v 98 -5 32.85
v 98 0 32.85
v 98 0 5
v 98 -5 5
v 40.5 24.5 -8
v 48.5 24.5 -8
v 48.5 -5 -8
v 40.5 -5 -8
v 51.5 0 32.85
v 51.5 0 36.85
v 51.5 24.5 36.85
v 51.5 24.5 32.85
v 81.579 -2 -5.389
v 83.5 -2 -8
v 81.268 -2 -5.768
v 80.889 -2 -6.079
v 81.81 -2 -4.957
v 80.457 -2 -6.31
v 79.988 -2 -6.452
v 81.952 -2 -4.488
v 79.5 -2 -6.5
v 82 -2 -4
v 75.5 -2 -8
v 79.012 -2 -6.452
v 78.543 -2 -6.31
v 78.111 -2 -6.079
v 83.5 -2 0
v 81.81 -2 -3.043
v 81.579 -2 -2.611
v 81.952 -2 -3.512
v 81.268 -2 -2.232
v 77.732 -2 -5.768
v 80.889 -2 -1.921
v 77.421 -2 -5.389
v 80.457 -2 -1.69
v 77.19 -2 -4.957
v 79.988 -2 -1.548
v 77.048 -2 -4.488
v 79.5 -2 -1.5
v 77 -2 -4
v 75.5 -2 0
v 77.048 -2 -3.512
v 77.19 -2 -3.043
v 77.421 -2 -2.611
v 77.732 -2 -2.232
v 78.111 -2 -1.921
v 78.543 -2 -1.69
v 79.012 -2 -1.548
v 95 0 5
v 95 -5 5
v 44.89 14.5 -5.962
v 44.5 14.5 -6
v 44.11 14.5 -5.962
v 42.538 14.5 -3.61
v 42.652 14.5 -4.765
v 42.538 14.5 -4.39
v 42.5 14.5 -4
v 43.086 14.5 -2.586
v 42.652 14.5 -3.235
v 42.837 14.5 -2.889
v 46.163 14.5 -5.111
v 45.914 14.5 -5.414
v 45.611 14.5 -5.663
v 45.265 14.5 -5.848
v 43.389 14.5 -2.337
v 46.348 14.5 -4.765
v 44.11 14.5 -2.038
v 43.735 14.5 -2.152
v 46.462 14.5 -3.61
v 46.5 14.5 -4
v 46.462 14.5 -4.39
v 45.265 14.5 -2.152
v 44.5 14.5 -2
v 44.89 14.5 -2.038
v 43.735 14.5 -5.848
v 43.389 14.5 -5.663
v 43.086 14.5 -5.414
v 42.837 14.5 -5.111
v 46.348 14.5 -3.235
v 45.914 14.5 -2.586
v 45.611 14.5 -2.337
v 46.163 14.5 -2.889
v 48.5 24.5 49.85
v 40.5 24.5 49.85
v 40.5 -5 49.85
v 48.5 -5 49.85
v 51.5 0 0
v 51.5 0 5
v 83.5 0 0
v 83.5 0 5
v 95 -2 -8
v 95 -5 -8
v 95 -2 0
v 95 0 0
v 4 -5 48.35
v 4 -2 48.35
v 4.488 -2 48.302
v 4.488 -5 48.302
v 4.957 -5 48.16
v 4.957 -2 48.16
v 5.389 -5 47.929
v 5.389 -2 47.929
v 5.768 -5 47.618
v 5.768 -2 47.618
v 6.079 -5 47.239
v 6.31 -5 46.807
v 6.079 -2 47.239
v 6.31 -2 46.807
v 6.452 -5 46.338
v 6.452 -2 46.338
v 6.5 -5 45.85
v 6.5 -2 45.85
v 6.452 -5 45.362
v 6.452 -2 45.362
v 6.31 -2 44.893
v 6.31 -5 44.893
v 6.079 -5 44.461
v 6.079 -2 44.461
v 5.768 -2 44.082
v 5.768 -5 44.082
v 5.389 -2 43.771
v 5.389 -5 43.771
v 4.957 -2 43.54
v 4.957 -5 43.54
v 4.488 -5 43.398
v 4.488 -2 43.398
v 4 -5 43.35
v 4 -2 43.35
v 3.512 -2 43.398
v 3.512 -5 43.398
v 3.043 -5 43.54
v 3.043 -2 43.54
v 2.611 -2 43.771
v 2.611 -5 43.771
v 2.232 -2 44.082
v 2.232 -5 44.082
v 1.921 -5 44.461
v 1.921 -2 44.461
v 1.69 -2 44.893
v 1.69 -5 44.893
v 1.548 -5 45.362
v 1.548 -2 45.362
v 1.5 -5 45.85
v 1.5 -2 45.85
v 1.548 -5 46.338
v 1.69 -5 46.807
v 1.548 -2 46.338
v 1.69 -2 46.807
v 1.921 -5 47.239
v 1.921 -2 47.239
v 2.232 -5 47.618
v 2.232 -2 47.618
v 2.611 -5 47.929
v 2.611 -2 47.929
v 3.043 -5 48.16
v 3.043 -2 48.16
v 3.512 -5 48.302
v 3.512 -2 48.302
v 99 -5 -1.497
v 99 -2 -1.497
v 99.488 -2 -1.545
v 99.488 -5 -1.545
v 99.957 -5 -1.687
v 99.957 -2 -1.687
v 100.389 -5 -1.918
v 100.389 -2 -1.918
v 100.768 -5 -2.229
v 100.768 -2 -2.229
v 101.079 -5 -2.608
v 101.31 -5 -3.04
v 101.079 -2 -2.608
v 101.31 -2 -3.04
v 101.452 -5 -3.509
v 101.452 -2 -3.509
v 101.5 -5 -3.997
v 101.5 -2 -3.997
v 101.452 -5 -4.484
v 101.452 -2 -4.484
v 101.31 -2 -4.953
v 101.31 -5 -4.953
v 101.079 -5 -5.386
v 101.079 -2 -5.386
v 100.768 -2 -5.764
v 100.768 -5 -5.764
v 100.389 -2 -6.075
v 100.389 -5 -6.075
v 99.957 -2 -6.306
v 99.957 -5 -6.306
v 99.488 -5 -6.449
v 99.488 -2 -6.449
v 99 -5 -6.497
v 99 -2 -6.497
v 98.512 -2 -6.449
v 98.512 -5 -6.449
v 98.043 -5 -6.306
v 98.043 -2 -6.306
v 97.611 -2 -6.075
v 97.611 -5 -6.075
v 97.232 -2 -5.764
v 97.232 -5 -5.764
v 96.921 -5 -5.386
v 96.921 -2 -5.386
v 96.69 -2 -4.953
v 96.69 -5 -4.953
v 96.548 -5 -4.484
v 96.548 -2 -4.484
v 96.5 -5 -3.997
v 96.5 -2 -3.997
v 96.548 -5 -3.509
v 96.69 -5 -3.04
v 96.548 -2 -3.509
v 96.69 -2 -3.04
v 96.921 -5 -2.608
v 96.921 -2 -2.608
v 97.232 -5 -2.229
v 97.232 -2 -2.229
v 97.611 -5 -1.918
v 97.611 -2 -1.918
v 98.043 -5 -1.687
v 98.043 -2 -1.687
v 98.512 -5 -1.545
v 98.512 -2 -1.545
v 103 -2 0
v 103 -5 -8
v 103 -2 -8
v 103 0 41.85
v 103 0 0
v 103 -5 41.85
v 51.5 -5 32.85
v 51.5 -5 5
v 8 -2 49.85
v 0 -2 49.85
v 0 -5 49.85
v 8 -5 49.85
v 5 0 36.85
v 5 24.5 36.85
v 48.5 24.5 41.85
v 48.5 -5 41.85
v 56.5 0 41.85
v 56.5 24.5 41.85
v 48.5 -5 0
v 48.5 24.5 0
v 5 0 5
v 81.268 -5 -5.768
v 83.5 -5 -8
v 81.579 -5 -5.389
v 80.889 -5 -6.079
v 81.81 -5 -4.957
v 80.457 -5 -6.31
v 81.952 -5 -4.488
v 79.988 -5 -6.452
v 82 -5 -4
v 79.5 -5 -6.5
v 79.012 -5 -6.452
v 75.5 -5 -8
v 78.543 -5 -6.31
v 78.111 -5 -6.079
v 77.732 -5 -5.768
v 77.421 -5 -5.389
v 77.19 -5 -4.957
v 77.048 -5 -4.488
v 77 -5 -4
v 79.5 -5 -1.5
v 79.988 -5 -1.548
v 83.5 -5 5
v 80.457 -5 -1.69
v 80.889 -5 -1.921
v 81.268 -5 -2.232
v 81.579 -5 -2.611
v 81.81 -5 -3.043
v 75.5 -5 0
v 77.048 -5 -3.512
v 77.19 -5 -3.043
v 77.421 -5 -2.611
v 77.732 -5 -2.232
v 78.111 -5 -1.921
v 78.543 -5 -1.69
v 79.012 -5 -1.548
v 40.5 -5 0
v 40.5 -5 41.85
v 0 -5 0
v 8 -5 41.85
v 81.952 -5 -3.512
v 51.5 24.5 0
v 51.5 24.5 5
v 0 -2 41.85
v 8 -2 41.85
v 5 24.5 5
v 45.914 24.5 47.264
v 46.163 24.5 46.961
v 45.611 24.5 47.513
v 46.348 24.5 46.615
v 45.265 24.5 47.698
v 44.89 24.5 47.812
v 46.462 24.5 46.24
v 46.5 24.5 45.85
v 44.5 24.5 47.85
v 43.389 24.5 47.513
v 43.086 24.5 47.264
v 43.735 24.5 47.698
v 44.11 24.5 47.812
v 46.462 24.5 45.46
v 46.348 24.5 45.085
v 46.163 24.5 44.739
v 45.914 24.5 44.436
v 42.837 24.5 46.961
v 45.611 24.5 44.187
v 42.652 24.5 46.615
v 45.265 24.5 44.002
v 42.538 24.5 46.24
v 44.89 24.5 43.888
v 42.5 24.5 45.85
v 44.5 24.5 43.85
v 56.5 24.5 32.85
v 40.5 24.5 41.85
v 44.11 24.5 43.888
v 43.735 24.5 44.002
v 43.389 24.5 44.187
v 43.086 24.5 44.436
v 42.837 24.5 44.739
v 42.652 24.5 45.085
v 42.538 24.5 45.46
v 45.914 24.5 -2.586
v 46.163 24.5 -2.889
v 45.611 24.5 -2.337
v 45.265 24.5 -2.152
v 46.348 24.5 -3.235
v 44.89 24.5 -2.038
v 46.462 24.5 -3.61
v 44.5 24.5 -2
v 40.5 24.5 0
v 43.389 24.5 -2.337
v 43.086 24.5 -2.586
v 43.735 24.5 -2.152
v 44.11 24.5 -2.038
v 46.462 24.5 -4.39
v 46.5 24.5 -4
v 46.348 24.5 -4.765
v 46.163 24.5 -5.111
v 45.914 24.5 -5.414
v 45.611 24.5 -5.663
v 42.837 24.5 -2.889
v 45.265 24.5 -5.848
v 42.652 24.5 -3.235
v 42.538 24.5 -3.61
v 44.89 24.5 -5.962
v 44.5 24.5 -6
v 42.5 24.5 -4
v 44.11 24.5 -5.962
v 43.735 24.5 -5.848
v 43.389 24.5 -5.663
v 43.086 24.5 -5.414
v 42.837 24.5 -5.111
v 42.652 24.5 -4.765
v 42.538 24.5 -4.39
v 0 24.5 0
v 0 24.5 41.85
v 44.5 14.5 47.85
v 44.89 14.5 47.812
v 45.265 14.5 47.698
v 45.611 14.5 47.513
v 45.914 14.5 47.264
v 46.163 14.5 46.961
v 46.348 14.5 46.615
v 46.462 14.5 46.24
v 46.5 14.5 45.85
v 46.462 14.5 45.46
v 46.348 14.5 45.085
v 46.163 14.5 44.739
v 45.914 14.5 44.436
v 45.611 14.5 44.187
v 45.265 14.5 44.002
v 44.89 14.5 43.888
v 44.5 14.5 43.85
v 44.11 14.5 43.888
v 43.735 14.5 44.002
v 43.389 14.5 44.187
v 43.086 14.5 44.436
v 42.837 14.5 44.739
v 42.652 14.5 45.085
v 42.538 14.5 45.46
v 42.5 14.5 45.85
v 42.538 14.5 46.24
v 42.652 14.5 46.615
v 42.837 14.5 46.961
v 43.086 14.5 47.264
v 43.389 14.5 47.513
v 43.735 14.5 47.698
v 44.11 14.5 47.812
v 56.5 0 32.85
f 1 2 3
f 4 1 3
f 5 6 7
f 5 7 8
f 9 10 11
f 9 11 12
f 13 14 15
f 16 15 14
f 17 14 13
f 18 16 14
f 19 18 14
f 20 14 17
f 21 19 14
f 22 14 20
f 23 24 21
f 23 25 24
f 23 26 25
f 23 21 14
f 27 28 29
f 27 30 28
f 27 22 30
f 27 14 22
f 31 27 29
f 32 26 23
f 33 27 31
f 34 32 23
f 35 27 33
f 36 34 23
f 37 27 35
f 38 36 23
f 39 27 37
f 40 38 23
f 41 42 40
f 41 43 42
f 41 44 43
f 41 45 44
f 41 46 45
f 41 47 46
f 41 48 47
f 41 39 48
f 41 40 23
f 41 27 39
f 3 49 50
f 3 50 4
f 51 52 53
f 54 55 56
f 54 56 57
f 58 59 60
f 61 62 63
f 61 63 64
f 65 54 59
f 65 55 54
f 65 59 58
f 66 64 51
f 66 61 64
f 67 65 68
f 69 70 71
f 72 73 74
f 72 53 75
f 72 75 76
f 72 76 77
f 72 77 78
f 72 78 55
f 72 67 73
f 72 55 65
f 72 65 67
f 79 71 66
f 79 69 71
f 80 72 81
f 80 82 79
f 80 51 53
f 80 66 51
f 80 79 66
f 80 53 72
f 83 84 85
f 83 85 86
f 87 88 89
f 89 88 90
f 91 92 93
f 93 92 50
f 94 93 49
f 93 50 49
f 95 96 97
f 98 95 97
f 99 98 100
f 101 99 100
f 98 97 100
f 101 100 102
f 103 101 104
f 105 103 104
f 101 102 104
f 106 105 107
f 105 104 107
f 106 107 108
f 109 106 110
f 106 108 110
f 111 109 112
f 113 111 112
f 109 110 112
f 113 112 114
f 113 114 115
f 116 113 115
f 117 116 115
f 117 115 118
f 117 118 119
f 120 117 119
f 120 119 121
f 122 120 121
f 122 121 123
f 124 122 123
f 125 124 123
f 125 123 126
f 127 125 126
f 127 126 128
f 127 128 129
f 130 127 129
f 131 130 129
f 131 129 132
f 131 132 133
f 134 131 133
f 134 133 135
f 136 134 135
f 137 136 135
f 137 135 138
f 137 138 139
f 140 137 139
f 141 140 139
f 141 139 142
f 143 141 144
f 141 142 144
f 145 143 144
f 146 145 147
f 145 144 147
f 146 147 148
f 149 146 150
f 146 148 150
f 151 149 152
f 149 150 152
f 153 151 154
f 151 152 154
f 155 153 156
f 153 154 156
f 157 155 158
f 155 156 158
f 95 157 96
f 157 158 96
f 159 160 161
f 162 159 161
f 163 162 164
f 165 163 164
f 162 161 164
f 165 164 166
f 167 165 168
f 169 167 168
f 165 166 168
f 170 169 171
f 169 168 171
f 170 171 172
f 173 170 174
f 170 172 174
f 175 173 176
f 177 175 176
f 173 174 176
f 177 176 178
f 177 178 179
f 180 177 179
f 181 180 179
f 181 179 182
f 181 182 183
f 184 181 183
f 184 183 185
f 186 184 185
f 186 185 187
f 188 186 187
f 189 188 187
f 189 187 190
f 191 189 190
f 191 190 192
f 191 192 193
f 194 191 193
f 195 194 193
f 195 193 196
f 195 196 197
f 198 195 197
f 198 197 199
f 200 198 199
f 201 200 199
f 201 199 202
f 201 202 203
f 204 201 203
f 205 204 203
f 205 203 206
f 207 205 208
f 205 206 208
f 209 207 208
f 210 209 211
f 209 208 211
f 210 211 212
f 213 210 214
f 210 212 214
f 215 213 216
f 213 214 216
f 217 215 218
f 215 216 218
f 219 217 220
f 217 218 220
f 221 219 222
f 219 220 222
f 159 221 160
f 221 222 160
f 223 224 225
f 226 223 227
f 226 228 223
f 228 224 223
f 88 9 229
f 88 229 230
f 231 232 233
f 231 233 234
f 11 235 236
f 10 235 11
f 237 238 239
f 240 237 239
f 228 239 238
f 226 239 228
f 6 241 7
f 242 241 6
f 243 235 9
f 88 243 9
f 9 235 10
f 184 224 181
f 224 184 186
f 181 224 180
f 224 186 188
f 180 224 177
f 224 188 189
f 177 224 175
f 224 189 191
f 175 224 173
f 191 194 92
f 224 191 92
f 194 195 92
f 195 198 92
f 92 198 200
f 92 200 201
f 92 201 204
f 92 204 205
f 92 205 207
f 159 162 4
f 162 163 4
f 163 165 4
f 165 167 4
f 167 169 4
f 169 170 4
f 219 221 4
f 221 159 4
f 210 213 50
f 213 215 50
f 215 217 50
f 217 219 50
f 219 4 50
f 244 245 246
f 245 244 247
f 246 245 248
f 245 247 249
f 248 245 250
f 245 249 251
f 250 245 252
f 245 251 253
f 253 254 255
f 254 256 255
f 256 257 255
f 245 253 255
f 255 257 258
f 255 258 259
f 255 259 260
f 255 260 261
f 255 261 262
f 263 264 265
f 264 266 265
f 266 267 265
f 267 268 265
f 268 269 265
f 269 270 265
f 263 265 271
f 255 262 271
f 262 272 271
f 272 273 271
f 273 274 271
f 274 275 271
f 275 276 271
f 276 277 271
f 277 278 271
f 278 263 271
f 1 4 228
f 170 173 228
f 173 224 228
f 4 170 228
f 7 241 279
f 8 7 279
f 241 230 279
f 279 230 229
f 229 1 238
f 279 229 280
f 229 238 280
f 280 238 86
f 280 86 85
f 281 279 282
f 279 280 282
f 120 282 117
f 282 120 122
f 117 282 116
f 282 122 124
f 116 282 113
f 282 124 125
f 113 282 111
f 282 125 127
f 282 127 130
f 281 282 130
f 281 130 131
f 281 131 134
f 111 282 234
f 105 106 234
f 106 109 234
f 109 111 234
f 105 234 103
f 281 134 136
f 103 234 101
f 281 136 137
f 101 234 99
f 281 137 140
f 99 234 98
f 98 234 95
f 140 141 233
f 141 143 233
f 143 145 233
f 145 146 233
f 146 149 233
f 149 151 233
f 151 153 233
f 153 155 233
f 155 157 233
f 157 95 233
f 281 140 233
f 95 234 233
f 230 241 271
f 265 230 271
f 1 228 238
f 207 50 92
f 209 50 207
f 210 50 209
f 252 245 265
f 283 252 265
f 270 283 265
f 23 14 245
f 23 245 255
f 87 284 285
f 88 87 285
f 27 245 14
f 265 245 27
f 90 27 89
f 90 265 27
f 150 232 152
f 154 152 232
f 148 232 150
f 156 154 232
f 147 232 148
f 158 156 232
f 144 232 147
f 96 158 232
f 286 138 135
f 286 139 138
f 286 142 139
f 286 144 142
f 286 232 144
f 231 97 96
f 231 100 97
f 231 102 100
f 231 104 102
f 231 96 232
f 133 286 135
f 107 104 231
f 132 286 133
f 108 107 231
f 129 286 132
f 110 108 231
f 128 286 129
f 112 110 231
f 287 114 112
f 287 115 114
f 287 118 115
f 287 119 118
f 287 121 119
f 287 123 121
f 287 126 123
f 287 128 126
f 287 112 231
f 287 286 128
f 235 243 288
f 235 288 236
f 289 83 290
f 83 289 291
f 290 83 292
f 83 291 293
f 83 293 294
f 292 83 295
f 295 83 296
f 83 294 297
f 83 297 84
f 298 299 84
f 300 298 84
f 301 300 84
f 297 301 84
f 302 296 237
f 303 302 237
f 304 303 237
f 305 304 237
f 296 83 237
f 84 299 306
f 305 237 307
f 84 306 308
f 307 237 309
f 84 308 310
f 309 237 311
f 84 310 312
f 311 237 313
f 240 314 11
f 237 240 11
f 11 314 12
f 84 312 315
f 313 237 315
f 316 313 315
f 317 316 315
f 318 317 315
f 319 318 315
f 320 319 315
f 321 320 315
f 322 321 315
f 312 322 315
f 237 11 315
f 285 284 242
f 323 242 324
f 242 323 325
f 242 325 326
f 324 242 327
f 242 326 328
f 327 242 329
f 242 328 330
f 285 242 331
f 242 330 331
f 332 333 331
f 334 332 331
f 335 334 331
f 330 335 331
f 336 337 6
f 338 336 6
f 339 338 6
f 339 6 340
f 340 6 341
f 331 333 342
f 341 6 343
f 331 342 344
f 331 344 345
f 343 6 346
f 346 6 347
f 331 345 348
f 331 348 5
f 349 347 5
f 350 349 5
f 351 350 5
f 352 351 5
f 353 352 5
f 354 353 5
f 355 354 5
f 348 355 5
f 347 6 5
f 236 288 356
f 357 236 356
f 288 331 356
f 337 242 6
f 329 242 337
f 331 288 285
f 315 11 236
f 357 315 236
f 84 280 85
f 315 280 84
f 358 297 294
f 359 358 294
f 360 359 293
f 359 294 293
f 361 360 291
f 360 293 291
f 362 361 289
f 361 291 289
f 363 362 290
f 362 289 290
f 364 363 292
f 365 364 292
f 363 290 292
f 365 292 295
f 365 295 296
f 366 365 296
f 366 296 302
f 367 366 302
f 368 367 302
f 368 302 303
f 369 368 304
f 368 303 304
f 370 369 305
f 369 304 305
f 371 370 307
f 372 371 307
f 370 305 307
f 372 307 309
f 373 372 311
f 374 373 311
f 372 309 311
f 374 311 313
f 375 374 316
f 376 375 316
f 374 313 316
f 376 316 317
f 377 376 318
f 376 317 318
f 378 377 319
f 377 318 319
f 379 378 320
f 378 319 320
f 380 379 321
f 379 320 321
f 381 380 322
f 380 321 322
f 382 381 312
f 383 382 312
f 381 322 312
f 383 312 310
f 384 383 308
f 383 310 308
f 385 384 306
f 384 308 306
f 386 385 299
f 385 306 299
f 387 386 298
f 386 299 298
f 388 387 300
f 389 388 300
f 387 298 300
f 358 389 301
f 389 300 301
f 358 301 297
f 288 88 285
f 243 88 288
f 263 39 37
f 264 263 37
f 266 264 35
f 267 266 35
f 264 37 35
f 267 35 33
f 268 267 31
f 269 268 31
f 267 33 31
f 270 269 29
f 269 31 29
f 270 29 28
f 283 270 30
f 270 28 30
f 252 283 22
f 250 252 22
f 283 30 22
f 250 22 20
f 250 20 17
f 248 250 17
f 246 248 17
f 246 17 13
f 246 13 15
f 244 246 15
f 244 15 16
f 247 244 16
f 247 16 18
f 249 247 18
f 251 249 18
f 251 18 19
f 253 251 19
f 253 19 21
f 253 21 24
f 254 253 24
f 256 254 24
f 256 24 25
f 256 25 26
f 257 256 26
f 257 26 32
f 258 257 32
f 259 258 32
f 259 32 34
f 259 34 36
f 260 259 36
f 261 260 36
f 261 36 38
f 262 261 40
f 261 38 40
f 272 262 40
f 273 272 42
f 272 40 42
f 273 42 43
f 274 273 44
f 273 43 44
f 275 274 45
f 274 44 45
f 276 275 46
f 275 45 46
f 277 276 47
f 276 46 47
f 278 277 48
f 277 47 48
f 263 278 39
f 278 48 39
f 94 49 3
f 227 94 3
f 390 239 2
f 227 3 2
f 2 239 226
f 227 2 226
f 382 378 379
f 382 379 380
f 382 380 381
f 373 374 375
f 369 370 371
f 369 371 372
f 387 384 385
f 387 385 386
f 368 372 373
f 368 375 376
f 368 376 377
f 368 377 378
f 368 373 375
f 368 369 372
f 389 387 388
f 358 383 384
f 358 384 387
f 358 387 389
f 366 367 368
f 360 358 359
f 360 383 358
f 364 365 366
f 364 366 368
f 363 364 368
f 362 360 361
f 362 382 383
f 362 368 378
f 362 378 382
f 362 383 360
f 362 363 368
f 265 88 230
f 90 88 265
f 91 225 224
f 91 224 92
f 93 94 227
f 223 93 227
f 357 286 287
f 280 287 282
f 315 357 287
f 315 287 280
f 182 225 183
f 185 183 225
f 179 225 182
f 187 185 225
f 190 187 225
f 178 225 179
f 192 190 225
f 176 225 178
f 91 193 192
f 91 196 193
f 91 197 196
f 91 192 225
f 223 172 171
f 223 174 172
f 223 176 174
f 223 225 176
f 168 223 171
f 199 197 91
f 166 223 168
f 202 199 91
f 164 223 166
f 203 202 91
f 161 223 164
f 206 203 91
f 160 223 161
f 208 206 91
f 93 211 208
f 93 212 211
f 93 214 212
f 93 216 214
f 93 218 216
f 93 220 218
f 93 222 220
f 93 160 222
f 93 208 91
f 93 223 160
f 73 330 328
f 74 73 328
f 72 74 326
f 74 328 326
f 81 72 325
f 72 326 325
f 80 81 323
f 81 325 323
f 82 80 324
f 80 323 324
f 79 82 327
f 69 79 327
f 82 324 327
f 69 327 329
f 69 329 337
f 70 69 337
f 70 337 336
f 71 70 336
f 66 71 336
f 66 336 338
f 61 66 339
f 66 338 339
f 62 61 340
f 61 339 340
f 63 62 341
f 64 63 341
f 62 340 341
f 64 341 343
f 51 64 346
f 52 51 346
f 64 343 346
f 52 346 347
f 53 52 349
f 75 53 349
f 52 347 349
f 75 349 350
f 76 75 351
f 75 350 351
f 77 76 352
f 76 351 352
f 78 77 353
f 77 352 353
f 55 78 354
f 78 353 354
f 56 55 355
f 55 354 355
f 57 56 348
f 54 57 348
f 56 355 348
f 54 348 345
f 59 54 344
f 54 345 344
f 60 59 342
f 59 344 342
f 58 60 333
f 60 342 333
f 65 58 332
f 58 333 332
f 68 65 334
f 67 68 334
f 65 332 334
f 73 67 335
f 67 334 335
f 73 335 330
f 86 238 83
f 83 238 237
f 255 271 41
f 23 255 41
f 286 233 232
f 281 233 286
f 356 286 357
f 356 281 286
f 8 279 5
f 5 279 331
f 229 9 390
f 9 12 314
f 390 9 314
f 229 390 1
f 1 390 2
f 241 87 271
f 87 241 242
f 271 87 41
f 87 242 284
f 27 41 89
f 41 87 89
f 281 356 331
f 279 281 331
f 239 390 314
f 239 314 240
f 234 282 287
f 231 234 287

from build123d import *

# Parameters (mm, degrees)
BOSS_EXTRUDE1_DEPTH = 24.5
SKETCH2_W           = 103
SKETCH2_H           = 41.85
BOSS_EXTRUDE2_DEPTH = 5
SKETCH3_W           = 46.5
SKETCH3_H           = 27.85
CUT_EXTRUDE1_DEPTH  = 26
SKETCH7_W           = 8
SKETCH7_H           = 3
BOSS_EXTRUDE3_DEPTH = 8
SKETCH8_R           = 2.5
CUT_EXTRUDE2_DEPTH  = 8
SKETCH9_W           = 8
SKETCH9_H           = 3
BOSS_EXTRUDE4_DEPTH = 8
SKETCH10_R          = 2.5
CUT_EXTRUDE3_DEPTH  = 8
SKETCH12_W          = 11.5
SKETCH12_H          = 5
CUT_EXTRUDE4_DEPTH  = 8
SKETCH14_W          = 8
SKETCH14_H          = 3
BOSS_EXTRUDE5_DEPTH = 8
SKETCH15_R          = 2.5
CUT_EXTRUDE5_DEPTH  = 8
SKETCH16_W          = 8
SKETCH16_H          = 29.5
BOSS_EXTRUDE6_DEPTH = 8
SKETCH17_W          = 8
SKETCH17_H          = 29.5
BOSS_EXTRUDE7_DEPTH = 8
SKETCH18_R          = 2
CUT_EXTRUDE6_DEPTH  = 10


with BuildPart() as part:
    # Sketch1 → Boss-Extrude1 (new body)
    with BuildSketch(Plane(origin=(0, 0, 0), x_dir=(1, 0, 0), z_dir=(0, 1, 0))):
        Polygon((0, 0), (51.5, 0), (51.5, -5), (5, -5), (5, -36.85), (51.5, -36.85), (51.5, -32.85), (56.5, -32.85), (56.5, -41.85), (0, -41.85), align=None)
    extrude(amount=BOSS_EXTRUDE1_DEPTH)

    # Sketch2 → Boss-Extrude2 (add)
    with BuildSketch(Plane.XZ):
        with Locations((51.5, 20.925)):
            Rectangle(SKETCH2_W, SKETCH2_H)
    extrude(amount=BOSS_EXTRUDE2_DEPTH)

    # Sketch3 → Cut-Extrude1 (cut)
    with BuildSketch(Plane(origin=(0, 0, 0), x_dir=(1, 0, 0), z_dir=(0, 1, 0))):
        with Locations((74.75, -18.925)):
            Rectangle(SKETCH3_W, SKETCH3_H)
    extrude(amount=-CUT_EXTRUDE1_DEPTH, mode=Mode.SUBTRACT)

    # Sketch7 → Boss-Extrude3 (add)
    with BuildSketch(Plane.XY.offset(41.85)):
        with Locations((4, -3.5)):
            Rectangle(SKETCH7_W, SKETCH7_H)
    extrude(amount=BOSS_EXTRUDE3_DEPTH)

    # Sketch8 → Cut-Extrude2 (cut)
    with BuildSketch(Plane(origin=(0, -2, 0), x_dir=(1, 0, 0), z_dir=(0, 1, 0))):
        with Locations(Location((4, -45.85, 0), (0, 0, 270))):
            Circle(SKETCH8_R)
    extrude(amount=-CUT_EXTRUDE2_DEPTH, mode=Mode.SUBTRACT)

    # Sketch9 → Boss-Extrude4 (add)
    with BuildSketch(Plane(origin=(0, 0, 0), x_dir=(-1, 0, 0), z_dir=(0, 0, -1))):
        with Locations((-99, -3.5)):
            Rectangle(SKETCH9_W, SKETCH9_H)
    extrude(amount=BOSS_EXTRUDE4_DEPTH)

    # Sketch10 → Cut-Extrude3 (cut)
    with BuildSketch(Plane(origin=(0, -2, 0), x_dir=(1, 0, 0), z_dir=(0, 1, 0))):
        with Locations(Location((99, 3.996680608, 0), (0, 0, 270))):
            Circle(SKETCH10_R)
    extrude(amount=-CUT_EXTRUDE3_DEPTH, mode=Mode.SUBTRACT)

    # Sketch12 → Cut-Extrude4 (cut)
    with BuildSketch(Plane(origin=(0, 0, 0), x_dir=(1, 0, 0), z_dir=(0, 1, 0))):
        with Locations((89.25, -2.5)):
            Rectangle(SKETCH12_W, SKETCH12_H)
    extrude(amount=-CUT_EXTRUDE4_DEPTH, mode=Mode.SUBTRACT)

    # Sketch14 → Boss-Extrude5 (add)
    with BuildSketch(Plane(origin=(0, 0, 0), x_dir=(-1, 0, 0), z_dir=(0, 0, -1))):
        with Locations((-79.5, -3.5)):
            Rectangle(SKETCH14_W, SKETCH14_H)
    extrude(amount=BOSS_EXTRUDE5_DEPTH)

    # Sketch15 → Cut-Extrude5 (cut)
    with BuildSketch(Plane(origin=(0, -2, 0), x_dir=(1, 0, 0), z_dir=(0, 1, 0))):
        with Locations(Location((79.5, 4, 0), (0, 0, 270))):
            Circle(SKETCH15_R)
    extrude(amount=-CUT_EXTRUDE5_DEPTH, mode=Mode.SUBTRACT)

    # Sketch16 → Boss-Extrude6 (add)
    with BuildSketch(Plane(origin=(0, 0, 0), x_dir=(-1, 0, 0), z_dir=(0, 0, -1))):
        with Locations((-44.5, 9.75)):
            Rectangle(SKETCH16_W, SKETCH16_H)
    extrude(amount=BOSS_EXTRUDE6_DEPTH)

    # Sketch17 → Boss-Extrude7 (add)
    with BuildSketch(Plane.XY.offset(41.85)):
        with Locations((44.5, 9.75)):
            Rectangle(SKETCH17_W, SKETCH17_H)
    extrude(amount=BOSS_EXTRUDE7_DEPTH)

    # Sketch18 → Cut-Extrude6 (cut)
    with BuildSketch(Plane(origin=(0, 24.5, 0), x_dir=(1, 0, 0), z_dir=(0, 1, 0))):
        with Locations(Location((44.5, 4, 0), (0, 0, 270))):
            Circle(SKETCH18_R)
        with Locations(Location((44.5, -45.85, 0), (0, 0, 270))):
            Circle(SKETCH18_R)
    extrude(amount=-CUT_EXTRUDE6_DEPTH, mode=Mode.SUBTRACT)


solid = part.part
